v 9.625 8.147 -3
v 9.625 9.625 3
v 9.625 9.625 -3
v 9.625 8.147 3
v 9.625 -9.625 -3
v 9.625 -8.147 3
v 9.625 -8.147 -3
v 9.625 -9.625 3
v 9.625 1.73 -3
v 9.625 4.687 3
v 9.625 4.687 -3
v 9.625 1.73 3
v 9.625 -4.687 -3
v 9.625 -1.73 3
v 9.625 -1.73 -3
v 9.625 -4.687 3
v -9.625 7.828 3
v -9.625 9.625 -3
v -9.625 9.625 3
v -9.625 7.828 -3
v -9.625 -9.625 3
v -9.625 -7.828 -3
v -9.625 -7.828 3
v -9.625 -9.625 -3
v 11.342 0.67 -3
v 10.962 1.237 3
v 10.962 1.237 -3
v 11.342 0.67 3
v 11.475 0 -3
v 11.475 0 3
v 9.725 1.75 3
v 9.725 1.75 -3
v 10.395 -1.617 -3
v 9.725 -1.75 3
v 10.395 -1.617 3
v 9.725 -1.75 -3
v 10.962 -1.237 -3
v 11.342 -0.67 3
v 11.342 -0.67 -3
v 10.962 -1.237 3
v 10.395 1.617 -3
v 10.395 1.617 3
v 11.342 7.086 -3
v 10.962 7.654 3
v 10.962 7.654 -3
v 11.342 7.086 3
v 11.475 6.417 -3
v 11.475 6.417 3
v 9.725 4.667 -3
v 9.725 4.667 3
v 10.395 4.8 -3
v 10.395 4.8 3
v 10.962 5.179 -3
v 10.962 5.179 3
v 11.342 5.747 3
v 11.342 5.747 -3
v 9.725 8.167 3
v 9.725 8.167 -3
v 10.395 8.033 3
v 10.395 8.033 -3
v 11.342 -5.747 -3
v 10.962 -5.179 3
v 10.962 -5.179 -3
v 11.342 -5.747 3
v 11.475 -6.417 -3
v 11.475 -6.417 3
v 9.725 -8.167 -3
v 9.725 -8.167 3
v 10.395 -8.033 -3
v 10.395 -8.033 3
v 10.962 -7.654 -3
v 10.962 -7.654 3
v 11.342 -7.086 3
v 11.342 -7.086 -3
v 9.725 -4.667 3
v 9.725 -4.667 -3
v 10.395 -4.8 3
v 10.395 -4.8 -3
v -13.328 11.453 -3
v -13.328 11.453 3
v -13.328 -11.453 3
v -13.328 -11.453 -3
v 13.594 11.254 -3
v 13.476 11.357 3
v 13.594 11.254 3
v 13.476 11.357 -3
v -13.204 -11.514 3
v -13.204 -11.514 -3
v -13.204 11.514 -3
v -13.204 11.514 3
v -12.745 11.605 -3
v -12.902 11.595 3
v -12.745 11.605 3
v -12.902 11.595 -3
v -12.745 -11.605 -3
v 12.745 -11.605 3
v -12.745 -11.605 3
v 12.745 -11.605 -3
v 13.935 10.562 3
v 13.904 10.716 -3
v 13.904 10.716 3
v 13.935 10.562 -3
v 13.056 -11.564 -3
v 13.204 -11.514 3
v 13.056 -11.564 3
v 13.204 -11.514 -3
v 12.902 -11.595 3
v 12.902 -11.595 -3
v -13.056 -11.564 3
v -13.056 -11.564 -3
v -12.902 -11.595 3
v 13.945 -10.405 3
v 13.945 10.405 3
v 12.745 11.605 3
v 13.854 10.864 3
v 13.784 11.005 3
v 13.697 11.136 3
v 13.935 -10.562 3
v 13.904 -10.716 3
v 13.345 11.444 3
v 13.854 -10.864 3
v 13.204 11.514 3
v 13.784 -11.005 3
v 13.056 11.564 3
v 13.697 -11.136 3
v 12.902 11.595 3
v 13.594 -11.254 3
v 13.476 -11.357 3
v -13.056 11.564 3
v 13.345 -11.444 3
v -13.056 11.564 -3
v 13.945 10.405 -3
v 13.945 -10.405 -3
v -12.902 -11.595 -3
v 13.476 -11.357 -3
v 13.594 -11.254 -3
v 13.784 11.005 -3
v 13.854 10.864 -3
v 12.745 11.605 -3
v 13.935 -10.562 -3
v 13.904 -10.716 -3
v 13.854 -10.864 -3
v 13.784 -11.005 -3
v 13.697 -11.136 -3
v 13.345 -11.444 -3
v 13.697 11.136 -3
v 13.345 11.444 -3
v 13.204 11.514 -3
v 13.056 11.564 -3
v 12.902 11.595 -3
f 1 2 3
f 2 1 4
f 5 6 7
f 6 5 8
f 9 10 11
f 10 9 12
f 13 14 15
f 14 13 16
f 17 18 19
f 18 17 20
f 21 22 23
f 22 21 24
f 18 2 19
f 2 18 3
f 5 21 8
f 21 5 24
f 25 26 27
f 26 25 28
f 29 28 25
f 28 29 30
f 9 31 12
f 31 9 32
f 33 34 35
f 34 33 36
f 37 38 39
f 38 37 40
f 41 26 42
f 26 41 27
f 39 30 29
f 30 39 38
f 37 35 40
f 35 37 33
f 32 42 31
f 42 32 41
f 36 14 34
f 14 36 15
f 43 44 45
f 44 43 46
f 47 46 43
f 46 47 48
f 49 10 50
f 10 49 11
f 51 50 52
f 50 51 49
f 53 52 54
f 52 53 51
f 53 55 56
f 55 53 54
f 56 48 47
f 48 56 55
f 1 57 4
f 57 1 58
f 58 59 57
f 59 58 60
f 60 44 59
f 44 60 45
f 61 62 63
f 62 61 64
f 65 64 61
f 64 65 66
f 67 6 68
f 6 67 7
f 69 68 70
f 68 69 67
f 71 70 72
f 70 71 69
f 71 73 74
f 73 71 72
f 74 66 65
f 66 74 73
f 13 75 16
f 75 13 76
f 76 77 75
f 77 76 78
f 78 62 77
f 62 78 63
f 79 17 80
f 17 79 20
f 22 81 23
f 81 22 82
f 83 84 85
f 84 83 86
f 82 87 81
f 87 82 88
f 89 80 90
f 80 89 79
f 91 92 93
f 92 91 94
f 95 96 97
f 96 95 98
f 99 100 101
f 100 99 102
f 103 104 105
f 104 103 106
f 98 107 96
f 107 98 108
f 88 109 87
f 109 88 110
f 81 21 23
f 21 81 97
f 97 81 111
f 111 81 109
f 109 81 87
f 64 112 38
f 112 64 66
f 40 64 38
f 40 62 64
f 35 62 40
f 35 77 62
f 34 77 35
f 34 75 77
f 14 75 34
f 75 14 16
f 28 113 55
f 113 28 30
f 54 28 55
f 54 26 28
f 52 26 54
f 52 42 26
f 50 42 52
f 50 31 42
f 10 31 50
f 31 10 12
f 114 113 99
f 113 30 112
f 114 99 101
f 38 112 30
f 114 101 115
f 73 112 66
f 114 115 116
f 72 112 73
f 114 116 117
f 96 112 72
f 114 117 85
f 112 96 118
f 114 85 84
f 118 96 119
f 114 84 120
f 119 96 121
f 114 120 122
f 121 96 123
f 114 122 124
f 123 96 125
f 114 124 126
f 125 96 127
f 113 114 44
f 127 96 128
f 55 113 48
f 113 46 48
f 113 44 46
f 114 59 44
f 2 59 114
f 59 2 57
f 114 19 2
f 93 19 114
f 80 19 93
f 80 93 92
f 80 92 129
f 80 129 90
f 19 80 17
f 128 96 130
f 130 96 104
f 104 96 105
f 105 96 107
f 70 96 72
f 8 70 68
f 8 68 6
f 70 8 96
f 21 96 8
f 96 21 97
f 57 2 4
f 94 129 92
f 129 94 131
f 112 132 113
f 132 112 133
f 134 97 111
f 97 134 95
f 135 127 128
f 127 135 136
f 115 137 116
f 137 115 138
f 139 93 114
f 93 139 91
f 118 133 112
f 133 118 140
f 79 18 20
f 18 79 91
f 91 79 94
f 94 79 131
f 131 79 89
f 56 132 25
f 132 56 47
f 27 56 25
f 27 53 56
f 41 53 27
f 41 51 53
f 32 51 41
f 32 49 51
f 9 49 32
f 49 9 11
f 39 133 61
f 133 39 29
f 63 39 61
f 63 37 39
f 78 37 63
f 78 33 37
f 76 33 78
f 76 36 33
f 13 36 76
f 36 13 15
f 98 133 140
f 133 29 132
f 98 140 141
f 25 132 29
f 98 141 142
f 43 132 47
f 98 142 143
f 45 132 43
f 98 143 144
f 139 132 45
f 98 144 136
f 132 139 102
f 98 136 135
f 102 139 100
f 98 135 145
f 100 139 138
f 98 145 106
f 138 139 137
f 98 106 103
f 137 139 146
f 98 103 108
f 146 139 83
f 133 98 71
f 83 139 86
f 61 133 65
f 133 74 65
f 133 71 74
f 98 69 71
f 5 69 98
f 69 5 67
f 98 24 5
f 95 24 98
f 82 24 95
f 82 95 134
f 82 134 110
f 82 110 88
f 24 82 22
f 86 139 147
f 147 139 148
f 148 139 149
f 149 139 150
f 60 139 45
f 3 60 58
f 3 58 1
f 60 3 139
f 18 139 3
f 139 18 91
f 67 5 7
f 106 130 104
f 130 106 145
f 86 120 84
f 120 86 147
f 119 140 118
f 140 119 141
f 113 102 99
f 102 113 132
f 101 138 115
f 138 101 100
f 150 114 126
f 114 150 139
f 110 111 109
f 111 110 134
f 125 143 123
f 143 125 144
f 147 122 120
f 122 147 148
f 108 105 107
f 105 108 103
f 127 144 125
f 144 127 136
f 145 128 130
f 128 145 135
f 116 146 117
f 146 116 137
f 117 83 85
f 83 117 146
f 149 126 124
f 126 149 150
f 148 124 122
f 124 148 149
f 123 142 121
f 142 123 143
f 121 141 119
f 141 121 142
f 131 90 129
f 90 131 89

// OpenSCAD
// file: Abar.scad
// generate C-channel for later use in cut-outs

mW = 16.33;
mH = 12.66;
L = 120;
pad=.1;
W = mW+pad;
H = mH+pad;
block = [L,W,H];
cutW = (1.5 * 2) + (pad * 2);
cutH = (2.0 + pad);

module abar(bblock=block){

translate([0,0,H/2])
difference(){
	cube(bblock, center=true);
	
	translate([0,0,cutH/2+.01])
		cube([L,W-cutW, H-cutH], center=true);
	}
}

abar();
// main file
// attach things to base...

use <./Abar.scad>

cB=25;
tubeXY = 19.25;
swX = 20.5;
swY = 10.3;
swZ = 6.5;
wireThick = 3.1;
wireZ = 3.65;
wire1 = 1.11;
wire2 = 11.38;
wire3 = 18.5;
leverHinge = 3.4;
leverExtends = 19.35;
hole1X = 5.15;
hole2X = 14.67;
holeY = 2.78;
holeRad = 2.5/2;
sur = 1.56;
totalX = sur*2 + swX;
totalY = sur + swY;
totalZ = swZ + sur;
posX = totalX/2;
posY = totalY/2 + sur/2;
posZ = totalZ/2;
groove= 1.75;
pH = 30;
Ang = 12.7;

module switch(){
	cube([swX,swY,swZ], center=true);
	translate([0 ,-posY,-.1])
		cube([wire3, 3+2+.1, wireZ+.1], center=true);
}

module switchbox(){
	difference(){
		union(){
		translate([totalX/2,totalY/2,totalZ/2])
			cube([totalX,totalY-.1,totalZ], center=true);			
		}
		translate([posX,posY,posZ])
			switch();
	}
}

module aluTube(){
	cube([tubeXY,tubeXY, pH+.1], center=true);
	translate([tubeXY/2+.1, 0, 0])
		cylinder(r=groove, h=pH+.1, center=true, $fn=16);
	translate([tubeXY/2+.1, tubeXY/3, 0])
		cylinder(r=groove, h=pH+.1, center=true, $fn=16);
	translate([tubeXY/2+.1, -tubeXY/3, 0])
		cylinder(r=groove, h=pH+.1, center=true, $fn=16);
	hull(){
	translate([-tubeXY/2 - sur*2+.2, 0, -pH]) rotate([0,-90,0])
		cylinder(r1=tubeXY/2-2, r2=tubeXY/2+sur*4-2, h=sur*4+.1, center=true);
	translate([-tubeXY/2 - sur*2+.2, 0, pH]) rotate([0,-90,0])
		cylinder(r1=tubeXY/2-2, r2=tubeXY/2+sur*4-2, h=sur*4+.1,center=true);
		}
}

module plasticTube(cH=3){
	minkowski(){
	cube([tubeXY+sur*4,tubeXY+sur, cH], center=true);
	cylinder(r=1.2, h=cH, $fn=48, center=true);
	}

}

module holderclip(){
	difference(){
	plasticTube();
	aluTube();
	}
}

module placeBox(){
	translate([-totalX/2-(pH/2*sin(Ang)-sur-.2),tubeXY,0]) rotate([90,Ang,0])
		switchbox();
}
holderclip();
